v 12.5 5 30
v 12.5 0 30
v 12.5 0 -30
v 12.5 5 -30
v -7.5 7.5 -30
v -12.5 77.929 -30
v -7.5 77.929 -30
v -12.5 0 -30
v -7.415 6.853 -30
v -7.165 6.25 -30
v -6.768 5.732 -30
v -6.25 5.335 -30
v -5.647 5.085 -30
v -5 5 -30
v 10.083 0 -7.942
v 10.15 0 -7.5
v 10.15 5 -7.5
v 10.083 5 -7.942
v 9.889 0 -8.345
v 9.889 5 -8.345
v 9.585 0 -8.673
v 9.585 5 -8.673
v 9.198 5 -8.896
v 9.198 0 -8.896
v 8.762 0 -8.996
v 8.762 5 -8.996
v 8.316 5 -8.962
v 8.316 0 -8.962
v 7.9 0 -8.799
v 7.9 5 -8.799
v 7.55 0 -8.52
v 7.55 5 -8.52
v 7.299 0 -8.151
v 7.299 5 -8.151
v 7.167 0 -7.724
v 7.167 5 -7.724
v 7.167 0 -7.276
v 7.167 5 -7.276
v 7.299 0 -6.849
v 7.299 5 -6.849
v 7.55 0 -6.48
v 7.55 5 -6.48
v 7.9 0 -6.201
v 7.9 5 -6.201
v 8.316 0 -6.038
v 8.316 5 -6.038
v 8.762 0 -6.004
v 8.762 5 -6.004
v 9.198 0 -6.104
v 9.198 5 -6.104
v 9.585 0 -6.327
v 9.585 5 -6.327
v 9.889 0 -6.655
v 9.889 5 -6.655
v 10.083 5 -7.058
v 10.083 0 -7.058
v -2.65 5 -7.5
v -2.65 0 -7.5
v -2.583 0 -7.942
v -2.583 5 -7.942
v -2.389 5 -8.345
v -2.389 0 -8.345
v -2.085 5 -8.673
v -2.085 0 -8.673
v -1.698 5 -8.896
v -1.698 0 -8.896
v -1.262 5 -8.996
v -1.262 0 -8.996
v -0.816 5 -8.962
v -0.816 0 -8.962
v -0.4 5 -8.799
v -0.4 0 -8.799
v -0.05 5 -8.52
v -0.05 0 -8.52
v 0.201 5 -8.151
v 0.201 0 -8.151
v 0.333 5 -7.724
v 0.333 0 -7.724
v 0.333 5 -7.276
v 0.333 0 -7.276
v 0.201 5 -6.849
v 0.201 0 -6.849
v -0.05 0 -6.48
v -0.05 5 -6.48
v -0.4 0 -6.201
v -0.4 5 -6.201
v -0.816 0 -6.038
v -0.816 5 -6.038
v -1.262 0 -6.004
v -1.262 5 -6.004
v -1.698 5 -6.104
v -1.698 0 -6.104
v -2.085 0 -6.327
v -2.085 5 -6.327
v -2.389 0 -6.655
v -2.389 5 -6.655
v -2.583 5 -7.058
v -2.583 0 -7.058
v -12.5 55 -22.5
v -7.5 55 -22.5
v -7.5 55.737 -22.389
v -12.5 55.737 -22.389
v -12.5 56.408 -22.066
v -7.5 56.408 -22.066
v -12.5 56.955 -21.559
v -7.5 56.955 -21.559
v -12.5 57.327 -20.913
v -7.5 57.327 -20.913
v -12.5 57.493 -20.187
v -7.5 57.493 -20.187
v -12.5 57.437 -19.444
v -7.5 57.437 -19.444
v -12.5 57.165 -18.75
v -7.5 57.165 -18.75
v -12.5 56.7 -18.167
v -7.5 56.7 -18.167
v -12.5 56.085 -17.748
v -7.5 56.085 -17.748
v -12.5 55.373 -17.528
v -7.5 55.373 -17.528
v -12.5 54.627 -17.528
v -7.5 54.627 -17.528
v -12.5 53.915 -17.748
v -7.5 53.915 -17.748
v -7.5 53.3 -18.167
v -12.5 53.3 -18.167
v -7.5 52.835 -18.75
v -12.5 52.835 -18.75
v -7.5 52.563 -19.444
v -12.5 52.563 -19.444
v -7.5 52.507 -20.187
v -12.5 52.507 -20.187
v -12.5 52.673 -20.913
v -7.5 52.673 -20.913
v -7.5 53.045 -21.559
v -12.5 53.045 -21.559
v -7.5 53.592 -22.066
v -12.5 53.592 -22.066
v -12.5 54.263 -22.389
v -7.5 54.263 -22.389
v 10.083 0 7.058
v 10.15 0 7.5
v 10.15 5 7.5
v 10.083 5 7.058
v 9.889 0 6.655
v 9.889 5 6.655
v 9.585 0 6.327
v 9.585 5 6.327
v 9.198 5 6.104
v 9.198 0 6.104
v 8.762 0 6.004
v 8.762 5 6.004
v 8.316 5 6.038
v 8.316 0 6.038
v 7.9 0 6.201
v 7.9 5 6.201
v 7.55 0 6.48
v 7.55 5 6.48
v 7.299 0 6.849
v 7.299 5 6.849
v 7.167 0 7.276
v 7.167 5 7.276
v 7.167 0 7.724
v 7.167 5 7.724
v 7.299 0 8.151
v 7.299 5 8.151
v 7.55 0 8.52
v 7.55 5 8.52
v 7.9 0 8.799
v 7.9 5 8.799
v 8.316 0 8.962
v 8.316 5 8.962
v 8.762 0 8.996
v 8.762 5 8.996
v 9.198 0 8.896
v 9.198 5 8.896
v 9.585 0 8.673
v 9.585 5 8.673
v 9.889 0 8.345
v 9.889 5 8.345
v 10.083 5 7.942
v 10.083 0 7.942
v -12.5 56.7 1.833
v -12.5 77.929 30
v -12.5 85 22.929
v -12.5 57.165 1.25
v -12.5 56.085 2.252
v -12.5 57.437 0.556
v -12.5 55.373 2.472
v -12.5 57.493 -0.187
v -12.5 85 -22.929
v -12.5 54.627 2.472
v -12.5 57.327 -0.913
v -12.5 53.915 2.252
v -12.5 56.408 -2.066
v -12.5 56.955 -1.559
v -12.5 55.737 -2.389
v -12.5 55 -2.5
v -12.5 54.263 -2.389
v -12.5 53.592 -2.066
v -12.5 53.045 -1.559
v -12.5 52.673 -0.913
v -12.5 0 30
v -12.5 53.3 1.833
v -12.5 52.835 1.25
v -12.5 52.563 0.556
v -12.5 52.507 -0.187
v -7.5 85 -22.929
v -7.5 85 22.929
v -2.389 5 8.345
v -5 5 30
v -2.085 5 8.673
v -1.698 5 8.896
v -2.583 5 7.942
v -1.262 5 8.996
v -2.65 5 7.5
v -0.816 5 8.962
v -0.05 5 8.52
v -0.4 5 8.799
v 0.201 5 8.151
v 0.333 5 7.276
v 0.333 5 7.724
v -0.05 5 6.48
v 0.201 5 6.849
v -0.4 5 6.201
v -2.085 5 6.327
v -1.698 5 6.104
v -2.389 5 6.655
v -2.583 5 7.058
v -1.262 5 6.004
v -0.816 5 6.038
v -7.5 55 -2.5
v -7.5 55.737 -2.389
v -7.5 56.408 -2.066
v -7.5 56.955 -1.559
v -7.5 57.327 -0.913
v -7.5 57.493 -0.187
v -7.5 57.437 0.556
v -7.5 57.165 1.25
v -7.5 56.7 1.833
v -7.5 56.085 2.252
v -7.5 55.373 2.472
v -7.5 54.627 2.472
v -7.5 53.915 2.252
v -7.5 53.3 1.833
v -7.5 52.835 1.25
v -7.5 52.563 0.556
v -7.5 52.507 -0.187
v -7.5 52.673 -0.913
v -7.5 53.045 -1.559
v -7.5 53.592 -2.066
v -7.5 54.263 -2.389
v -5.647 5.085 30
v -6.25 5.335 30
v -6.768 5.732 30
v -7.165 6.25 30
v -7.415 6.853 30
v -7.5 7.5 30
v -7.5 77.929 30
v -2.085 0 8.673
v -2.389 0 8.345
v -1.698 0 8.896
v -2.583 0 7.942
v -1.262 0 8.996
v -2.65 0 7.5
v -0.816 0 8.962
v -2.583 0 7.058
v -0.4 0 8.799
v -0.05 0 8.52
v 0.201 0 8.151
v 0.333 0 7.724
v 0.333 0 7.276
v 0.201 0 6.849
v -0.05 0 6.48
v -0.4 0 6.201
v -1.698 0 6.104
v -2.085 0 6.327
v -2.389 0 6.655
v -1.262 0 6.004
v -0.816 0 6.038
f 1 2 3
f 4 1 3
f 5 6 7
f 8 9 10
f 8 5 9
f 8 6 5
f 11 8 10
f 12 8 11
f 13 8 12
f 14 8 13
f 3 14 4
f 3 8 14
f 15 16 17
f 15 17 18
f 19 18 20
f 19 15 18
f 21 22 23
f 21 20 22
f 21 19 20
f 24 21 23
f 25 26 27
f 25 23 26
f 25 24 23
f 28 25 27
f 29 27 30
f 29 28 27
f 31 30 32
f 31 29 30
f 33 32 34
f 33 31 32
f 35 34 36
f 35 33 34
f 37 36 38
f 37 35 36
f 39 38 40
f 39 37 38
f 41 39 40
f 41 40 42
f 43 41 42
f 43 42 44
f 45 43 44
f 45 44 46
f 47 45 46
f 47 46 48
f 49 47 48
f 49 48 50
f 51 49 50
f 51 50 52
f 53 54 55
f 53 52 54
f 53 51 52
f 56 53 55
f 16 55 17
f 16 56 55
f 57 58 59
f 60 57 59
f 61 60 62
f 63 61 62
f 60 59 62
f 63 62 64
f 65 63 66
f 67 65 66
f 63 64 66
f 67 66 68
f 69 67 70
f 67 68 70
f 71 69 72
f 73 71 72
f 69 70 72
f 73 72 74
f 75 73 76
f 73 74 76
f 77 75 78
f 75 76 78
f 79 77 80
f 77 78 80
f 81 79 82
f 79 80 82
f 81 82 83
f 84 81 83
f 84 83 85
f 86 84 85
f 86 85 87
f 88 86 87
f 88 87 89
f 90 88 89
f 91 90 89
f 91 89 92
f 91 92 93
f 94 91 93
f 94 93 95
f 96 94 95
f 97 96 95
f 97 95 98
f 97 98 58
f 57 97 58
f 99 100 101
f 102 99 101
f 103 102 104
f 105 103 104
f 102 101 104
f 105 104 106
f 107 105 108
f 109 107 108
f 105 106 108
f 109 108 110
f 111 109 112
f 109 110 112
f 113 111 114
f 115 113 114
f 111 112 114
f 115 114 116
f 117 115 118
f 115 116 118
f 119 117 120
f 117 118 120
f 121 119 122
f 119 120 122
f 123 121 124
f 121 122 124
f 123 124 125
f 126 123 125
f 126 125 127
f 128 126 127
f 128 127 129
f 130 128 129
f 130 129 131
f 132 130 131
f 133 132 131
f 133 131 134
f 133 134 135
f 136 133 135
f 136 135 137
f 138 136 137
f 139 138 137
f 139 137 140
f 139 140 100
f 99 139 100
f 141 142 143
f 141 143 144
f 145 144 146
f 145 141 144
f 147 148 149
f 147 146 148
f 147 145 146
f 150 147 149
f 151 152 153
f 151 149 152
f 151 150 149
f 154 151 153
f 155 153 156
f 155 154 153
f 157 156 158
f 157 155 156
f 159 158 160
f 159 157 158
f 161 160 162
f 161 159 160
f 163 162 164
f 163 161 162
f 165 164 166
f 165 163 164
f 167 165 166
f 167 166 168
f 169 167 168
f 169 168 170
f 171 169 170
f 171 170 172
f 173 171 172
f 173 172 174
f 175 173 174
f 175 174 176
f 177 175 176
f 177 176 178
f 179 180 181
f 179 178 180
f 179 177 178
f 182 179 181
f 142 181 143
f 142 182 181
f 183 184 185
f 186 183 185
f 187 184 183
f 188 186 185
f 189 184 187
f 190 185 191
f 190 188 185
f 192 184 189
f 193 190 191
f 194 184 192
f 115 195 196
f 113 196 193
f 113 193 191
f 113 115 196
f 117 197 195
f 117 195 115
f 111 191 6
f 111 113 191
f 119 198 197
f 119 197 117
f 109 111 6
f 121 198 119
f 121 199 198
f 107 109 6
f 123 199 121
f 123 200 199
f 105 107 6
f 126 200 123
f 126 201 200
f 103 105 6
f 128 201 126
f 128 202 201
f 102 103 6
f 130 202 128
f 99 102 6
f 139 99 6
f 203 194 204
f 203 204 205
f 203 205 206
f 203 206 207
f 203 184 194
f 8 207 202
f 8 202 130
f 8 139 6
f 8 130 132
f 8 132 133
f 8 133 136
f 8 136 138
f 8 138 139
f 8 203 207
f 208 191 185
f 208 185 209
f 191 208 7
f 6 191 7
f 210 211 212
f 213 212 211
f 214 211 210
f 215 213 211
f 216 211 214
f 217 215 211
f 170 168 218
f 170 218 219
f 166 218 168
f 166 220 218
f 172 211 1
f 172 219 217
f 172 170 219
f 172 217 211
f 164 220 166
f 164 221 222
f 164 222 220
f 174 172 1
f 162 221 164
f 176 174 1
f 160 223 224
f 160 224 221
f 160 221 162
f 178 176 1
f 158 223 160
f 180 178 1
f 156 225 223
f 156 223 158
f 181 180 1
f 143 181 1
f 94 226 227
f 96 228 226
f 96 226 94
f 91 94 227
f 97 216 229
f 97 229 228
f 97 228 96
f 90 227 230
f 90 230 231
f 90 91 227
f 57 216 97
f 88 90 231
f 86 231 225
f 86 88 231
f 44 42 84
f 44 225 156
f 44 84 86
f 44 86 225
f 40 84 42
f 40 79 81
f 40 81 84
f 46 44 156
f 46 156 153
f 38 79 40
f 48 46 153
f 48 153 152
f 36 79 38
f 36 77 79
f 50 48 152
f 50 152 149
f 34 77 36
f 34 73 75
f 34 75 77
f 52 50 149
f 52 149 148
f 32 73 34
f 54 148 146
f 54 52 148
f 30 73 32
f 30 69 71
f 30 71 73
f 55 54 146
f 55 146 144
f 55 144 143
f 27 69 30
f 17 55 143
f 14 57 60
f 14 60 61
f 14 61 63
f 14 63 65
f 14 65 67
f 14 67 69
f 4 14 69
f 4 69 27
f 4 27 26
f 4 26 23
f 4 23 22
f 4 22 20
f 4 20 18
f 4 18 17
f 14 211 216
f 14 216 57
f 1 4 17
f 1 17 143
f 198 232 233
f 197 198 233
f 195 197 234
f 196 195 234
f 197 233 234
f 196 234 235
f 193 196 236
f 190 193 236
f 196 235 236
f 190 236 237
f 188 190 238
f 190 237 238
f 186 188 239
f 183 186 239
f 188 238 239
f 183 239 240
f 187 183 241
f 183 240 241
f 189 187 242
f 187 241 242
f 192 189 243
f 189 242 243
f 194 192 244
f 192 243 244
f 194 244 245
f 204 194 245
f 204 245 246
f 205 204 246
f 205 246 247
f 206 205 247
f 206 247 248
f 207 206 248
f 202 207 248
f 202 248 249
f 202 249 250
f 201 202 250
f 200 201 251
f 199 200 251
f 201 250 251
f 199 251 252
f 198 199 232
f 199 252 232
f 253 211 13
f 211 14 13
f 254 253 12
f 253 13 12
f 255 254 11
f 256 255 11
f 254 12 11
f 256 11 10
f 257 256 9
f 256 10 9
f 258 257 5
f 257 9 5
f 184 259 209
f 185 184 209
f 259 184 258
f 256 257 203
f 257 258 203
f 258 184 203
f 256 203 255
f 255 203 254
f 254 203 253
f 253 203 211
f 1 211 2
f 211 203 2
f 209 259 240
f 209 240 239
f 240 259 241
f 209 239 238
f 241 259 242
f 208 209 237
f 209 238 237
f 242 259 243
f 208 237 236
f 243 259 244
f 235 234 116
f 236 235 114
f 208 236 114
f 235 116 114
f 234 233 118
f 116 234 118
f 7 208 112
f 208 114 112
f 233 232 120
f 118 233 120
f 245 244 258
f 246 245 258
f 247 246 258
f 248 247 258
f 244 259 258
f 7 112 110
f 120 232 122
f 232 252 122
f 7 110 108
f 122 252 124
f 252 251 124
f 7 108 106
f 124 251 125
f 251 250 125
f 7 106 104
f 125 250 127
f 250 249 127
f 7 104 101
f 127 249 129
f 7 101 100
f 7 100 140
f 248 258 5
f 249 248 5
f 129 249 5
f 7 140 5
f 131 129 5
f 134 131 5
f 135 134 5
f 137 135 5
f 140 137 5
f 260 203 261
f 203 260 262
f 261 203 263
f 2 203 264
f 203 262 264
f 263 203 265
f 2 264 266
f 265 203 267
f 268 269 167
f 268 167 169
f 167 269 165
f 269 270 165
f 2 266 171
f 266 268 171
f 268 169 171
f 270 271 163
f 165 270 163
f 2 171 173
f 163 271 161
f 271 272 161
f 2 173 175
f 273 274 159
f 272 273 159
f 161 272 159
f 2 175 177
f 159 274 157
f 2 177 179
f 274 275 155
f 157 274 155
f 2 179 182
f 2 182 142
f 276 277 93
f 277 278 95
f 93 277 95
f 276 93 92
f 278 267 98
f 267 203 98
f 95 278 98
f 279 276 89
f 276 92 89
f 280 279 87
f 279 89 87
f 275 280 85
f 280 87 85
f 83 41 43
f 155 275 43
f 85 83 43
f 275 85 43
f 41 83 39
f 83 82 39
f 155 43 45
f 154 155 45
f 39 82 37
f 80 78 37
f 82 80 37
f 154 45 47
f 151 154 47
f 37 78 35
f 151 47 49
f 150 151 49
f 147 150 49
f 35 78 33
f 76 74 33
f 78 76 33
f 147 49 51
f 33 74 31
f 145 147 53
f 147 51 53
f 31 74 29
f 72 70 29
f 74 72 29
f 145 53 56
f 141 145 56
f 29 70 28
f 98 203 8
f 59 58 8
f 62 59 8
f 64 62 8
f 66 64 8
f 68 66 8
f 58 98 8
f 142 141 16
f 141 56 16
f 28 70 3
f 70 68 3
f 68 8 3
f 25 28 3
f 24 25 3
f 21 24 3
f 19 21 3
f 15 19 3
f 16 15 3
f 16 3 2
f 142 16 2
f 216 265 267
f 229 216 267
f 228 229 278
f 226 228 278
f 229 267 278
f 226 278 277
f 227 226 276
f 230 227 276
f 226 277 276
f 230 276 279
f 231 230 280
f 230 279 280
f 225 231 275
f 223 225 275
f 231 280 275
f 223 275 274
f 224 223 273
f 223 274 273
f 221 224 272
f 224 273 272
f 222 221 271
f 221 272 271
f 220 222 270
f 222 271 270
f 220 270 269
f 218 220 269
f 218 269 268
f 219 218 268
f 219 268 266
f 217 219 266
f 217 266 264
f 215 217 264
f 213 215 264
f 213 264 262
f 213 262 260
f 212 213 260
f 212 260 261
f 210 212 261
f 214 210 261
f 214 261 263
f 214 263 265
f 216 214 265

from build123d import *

# Parameters (mm, degrees)
SKETCH1_W             = 25
SKETCH1_H             = 60
BOSS_EXTRUDE1_DEPTH   = 5
SKETCH8_W             = 5
SKETCH8_H             = 60
BOSS_EXTRUDE2_DEPTH   = 80
SKETCH9_R             = 2.5
CUT_EXTRUDE1_DEPTH    = 5
CUT_EXTRUDE2_REACH    = 7
FILLET1_R             = 2.5
F_3_0MM_DOWEL_HOLE2_D = 3
SKETCH15_R            = 2.5
CUT_EXTRUDE3_DEPTH    = 6


with BuildPart() as part:
    # Sketch1 → Boss-Extrude1 (new body)
    with BuildSketch(Plane(origin=(0, 0, 0), x_dir=(1, 0, 0), z_dir=(0, 1, 0))):
        Rectangle(SKETCH1_W, SKETCH1_H)
    extrude(amount=BOSS_EXTRUDE1_DEPTH)

    # Sketch8 → Boss-Extrude2 (add)
    with BuildSketch(Plane(origin=(0, 5, 0), x_dir=(1, 0, 0), z_dir=(0, 1, 0))):
        with Locations((-10, 0)):
            Rectangle(SKETCH8_W, SKETCH8_H)
    extrude(amount=BOSS_EXTRUDE2_DEPTH)

    # Sketch9 → Cut-Extrude1 (cut)
    with BuildSketch(Plane(origin=(-7.5, 0, 0), x_dir=(0, 0, -1), z_dir=(1, 0, 0))):
        with Locations((0, 55)):
            Circle(SKETCH9_R)
    extrude(amount=-CUT_EXTRUDE1_DEPTH, mode=Mode.SUBTRACT)

    # Sketch10 → Cut-Extrude2 (cut, up to next)
    with BuildSketch(Plane(origin=(-7.5, 0, 0), x_dir=(0, 0, -1), z_dir=(1, 0, 0)), mode=Mode.PRIVATE) as cut_extrude2_sk1:
        Polygon((-30, 77.928932188), (-22.928932188, 85), (-30, 85), align=None)
    cut_extrude2_tool1 = extrude(cut_extrude2_sk1.sketch, amount=-CUT_EXTRUDE2_REACH, mode=Mode.PRIVATE) & part.part
    add(cut_extrude2_tool1.solids().sort_by_distance((-7.5, 82.642977, 27.642977))[0], mode=Mode.SUBTRACT)
    # Sketch10 → Cut-Extrude2 (cut, up to next)
    with BuildSketch(Plane(origin=(-7.5, 0, 0), x_dir=(0, 0, -1), z_dir=(1, 0, 0)), mode=Mode.PRIVATE) as cut_extrude2_sk2:
        Polygon((22.928932188, 85), (30, 77.928932188), (30, 85), align=None)
    cut_extrude2_tool2 = extrude(cut_extrude2_sk2.sketch, amount=-CUT_EXTRUDE2_REACH, mode=Mode.PRIVATE) & part.part
    add(cut_extrude2_tool2.solids().sort_by_distance((-7.5, 82.642977, -27.642977))[0], mode=Mode.SUBTRACT)

    # Fillet1
    fillet1_edges = [part.edges().sort_by_distance(p)[0] for p in [
        (-7.5, 5, 0),
    ]]
    fillet(fillet1_edges, radius=FILLET1_R)

    # Ø3.0mm Dowel Hole2 (through all)
    with Locations(Plane(origin=(0, 5, 0), x_dir=(1, 0, 0), z_dir=(0, 1, 0))):
        with Locations((-1.15, -7.5), (-1.15, 7.5)):
            f_3_0mm_dowel_hole2 = Hole(F_3_0MM_DOWEL_HOLE2_D / 2)

    # Mirror1: Ø3.0mm Dowel Hole2 across plane
    add(f_3_0mm_dowel_hole2.mirror(Plane(origin=(3.75, 0, 0), x_dir=(0, 0, 1), z_dir=(1, 0, 0))), mode=Mode.SUBTRACT)

    # Sketch15 → Cut-Extrude3 (cut, through all)
    with BuildSketch(Plane(origin=(-7.5, 0, 0), x_dir=(0, 0, -1), z_dir=(1, 0, 0))):
        with Locations((20, 55)):
            Circle(SKETCH15_R)
    extrude(amount=-CUT_EXTRUDE3_DEPTH, mode=Mode.SUBTRACT)


solid = part.part
